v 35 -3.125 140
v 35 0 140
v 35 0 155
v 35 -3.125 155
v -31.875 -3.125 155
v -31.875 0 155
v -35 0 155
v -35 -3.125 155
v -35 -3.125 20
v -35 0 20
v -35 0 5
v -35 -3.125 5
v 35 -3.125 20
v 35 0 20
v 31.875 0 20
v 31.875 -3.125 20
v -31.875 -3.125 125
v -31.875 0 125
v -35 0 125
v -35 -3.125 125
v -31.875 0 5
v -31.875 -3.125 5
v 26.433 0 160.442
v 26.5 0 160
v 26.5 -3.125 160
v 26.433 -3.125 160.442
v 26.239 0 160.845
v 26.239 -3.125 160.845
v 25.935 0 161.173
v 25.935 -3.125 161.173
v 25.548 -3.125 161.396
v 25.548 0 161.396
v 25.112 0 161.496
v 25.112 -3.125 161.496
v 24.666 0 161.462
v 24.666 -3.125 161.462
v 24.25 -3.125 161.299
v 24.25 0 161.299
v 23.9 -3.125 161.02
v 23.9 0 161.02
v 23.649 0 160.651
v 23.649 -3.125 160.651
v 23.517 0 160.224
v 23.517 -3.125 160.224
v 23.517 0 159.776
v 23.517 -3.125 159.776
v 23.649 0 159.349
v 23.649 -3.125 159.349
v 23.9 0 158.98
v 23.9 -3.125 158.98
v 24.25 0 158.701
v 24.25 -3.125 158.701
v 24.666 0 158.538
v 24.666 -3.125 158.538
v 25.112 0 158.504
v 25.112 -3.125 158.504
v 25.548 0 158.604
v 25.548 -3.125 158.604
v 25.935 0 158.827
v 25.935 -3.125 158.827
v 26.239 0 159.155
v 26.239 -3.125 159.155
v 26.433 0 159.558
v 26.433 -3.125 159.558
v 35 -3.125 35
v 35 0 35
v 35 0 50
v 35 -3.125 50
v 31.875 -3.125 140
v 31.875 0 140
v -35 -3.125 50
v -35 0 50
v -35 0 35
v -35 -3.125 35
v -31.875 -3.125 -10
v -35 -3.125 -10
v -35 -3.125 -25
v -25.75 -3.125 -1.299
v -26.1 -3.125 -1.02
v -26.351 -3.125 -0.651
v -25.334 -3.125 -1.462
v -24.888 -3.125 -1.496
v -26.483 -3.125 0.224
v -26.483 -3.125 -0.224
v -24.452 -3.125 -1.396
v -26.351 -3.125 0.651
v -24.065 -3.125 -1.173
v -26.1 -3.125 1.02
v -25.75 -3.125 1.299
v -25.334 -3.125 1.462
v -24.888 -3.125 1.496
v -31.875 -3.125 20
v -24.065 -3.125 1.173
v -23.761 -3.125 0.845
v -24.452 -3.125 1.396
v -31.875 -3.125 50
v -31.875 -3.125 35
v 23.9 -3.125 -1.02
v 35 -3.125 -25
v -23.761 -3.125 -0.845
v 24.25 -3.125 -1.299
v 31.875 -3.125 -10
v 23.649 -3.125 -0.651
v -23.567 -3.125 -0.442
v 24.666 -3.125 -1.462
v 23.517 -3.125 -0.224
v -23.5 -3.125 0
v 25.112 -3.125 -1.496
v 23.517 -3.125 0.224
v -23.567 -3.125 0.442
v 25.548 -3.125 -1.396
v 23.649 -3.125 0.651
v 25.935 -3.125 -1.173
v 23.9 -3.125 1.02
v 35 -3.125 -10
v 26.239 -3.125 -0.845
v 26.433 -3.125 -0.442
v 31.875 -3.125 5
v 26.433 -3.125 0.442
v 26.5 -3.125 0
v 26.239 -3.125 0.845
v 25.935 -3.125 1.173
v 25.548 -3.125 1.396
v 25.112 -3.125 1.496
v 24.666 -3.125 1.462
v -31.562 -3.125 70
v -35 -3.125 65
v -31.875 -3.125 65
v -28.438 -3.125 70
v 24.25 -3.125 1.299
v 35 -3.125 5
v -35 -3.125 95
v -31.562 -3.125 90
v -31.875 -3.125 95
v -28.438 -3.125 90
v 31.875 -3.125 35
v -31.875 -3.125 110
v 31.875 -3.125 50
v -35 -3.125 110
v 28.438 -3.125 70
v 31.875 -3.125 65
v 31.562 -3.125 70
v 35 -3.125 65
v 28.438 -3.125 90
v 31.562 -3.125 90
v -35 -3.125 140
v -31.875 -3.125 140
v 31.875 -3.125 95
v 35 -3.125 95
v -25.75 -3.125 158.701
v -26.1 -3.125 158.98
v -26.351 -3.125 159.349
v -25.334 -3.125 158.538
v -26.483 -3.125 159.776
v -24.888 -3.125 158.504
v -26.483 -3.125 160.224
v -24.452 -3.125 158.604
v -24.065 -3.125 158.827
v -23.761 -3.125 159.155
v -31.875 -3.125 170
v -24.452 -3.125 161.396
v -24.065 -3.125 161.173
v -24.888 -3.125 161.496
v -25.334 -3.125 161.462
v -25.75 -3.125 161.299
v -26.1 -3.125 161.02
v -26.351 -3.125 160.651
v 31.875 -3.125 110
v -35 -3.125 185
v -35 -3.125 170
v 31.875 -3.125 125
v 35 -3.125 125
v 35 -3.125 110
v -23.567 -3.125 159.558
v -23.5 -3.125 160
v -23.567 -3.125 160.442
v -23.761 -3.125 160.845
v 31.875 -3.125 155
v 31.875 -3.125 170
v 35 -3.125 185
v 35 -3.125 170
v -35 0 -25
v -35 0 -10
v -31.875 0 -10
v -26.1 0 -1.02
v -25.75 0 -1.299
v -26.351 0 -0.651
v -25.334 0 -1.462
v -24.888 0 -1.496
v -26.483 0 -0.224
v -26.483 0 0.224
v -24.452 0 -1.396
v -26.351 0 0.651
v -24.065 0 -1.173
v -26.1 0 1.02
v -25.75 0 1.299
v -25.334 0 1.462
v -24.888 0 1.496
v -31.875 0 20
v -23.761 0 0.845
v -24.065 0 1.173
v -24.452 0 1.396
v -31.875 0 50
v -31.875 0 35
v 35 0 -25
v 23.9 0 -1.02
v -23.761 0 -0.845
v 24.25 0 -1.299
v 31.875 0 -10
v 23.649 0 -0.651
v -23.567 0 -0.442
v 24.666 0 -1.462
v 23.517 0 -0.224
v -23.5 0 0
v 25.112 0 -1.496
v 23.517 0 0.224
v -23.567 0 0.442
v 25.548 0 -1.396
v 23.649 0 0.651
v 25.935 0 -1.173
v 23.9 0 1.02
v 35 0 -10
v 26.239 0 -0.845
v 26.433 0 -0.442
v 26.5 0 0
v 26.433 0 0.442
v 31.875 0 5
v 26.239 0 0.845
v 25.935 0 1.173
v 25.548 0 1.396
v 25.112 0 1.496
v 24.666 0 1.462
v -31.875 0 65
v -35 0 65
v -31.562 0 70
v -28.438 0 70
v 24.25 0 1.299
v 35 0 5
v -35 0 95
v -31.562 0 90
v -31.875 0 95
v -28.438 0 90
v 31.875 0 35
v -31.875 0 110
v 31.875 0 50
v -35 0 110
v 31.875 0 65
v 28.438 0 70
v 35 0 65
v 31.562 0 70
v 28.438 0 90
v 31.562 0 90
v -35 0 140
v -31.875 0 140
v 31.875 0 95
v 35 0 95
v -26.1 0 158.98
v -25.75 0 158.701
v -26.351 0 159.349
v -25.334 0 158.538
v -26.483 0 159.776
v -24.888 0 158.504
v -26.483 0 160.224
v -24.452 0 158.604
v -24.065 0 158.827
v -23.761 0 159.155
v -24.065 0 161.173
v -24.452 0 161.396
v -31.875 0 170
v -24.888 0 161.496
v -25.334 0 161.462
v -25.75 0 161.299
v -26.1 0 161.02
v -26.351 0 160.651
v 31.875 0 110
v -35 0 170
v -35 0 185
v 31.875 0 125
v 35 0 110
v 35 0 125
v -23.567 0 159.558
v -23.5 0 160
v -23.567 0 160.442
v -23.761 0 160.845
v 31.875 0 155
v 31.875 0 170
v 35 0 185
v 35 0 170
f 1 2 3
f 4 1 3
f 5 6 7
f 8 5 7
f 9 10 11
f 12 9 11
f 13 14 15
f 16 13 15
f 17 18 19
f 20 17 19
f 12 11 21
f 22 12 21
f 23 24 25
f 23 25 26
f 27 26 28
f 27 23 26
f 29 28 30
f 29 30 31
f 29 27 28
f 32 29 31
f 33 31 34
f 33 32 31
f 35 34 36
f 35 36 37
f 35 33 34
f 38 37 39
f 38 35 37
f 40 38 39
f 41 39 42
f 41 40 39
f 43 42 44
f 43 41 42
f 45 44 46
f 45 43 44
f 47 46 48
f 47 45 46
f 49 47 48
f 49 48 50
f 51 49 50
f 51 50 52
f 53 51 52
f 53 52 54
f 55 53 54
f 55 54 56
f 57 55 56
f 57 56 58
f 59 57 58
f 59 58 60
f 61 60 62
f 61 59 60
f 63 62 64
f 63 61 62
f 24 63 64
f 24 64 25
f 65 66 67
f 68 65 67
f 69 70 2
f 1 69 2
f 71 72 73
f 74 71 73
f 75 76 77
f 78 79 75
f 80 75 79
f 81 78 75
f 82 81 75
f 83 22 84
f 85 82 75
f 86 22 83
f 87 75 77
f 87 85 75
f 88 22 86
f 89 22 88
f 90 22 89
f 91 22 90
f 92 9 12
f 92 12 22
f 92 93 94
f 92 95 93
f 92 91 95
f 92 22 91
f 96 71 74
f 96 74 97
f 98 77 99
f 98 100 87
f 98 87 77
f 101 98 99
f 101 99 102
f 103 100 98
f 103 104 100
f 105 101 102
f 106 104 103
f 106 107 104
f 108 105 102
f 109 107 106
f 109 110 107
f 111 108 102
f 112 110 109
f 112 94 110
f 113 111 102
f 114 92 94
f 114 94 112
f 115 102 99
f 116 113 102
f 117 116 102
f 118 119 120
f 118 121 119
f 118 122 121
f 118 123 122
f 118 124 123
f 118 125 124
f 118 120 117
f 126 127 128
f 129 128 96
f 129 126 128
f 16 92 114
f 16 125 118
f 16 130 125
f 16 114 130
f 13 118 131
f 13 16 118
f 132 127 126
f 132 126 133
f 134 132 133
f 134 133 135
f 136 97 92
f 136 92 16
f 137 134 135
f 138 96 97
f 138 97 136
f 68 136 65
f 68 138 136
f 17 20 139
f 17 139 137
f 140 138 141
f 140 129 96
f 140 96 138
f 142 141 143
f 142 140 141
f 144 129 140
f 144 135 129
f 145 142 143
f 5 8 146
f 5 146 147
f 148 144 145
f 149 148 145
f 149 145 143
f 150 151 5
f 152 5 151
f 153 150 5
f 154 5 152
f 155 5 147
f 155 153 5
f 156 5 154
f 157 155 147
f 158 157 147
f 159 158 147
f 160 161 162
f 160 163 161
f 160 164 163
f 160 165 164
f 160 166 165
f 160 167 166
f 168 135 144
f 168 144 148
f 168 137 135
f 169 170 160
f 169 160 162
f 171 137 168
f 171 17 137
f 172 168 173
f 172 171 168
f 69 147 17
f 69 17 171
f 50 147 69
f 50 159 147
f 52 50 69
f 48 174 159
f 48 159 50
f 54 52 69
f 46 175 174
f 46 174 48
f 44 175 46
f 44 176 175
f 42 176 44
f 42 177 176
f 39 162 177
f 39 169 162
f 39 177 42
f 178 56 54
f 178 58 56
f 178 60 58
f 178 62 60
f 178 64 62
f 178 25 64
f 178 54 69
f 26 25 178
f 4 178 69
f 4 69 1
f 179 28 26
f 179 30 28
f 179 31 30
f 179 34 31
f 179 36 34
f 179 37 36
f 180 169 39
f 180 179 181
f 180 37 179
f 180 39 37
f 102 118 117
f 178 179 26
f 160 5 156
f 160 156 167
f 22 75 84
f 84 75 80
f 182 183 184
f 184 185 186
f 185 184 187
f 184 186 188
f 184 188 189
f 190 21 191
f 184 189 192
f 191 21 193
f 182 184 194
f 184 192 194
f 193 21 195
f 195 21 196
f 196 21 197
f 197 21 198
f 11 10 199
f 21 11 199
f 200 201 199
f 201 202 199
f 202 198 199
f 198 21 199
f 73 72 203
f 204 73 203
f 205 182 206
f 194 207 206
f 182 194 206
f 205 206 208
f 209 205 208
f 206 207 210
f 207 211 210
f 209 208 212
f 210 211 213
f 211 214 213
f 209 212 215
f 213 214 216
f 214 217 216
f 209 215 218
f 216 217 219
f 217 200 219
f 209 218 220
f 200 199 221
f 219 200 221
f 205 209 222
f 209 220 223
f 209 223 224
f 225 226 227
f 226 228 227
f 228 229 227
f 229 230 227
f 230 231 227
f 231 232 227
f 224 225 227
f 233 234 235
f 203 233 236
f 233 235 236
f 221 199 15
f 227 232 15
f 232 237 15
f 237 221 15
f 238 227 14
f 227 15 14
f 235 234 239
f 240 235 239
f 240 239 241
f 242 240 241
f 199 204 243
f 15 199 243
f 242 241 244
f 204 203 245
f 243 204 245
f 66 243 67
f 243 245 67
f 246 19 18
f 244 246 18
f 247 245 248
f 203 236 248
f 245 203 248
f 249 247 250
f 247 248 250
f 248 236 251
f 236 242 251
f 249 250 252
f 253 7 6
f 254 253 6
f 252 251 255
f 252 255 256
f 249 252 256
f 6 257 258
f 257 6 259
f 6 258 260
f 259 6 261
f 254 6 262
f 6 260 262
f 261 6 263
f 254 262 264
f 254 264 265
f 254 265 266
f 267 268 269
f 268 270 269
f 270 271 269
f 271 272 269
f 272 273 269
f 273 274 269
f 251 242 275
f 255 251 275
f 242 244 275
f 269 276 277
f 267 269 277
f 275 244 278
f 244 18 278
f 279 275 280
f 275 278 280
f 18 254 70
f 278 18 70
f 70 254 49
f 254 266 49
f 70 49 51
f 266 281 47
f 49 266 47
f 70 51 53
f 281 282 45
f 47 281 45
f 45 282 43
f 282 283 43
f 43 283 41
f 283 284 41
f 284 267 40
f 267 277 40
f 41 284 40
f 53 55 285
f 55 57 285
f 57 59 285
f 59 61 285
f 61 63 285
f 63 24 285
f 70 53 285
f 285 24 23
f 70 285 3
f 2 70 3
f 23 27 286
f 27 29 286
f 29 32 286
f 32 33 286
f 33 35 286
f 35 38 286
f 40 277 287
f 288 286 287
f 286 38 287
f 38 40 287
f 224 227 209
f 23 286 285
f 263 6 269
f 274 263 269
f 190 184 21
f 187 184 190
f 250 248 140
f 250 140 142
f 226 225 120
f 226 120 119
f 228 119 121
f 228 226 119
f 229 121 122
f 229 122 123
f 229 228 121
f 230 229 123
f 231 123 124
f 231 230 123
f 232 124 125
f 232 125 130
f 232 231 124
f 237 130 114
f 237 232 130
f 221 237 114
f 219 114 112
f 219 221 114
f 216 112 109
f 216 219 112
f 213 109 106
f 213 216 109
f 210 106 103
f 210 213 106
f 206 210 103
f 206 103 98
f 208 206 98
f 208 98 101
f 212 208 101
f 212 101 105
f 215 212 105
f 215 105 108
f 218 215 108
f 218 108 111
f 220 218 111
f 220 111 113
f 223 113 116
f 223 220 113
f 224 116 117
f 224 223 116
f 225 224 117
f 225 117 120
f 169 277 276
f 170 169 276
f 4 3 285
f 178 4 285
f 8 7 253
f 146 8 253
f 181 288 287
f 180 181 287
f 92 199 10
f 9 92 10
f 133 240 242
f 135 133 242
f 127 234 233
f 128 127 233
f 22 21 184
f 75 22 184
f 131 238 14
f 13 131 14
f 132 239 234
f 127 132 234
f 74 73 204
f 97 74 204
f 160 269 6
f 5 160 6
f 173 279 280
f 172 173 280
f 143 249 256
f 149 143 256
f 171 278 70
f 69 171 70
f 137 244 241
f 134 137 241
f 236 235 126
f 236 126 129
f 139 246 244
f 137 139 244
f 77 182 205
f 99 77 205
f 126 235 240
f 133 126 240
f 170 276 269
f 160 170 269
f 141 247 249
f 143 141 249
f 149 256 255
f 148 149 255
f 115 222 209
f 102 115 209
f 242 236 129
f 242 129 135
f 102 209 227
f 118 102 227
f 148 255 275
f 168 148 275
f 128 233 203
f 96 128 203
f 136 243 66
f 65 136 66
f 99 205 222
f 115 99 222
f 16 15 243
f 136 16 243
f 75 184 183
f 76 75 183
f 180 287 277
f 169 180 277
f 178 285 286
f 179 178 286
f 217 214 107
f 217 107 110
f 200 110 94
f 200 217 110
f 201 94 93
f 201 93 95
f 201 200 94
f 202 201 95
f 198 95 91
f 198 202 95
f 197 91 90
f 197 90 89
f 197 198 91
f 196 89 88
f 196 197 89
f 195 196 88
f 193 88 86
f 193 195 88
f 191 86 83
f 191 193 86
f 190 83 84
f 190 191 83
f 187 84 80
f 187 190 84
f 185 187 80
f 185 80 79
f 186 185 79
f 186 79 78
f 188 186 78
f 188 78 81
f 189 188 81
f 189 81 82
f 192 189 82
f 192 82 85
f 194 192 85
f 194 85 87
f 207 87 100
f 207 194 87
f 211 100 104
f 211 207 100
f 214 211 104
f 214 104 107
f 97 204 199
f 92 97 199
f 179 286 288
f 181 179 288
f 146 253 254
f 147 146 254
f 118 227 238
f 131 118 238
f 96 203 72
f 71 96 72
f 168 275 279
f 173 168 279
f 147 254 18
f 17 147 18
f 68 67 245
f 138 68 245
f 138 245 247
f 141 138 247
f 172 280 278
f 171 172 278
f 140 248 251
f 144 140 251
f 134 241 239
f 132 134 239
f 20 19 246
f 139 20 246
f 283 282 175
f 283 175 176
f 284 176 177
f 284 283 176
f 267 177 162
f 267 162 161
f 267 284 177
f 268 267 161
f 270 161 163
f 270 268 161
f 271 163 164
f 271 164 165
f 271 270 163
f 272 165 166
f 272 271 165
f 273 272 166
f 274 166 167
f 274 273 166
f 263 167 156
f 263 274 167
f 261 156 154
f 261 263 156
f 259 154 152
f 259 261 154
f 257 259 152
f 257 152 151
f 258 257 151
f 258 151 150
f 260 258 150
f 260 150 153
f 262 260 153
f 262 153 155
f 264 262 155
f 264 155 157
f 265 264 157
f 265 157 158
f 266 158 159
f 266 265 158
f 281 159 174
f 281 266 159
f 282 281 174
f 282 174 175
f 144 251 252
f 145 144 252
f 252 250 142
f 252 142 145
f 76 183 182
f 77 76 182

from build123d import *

# Parameters (mm, degrees)
F1_R     = 1.5
F1_W     = 3.125
F1_H     = 20
F2_DEPTH = 3.125


with BuildPart() as f2:
    # F1 (on Front) → F2 (new body)
    with BuildSketch(Plane.XZ):
        Polygon((-35, -25), (0, -25), (35, -25), (35, -10), (31.875, -10), (31.875, 5), (35, 5), (35, 20), (31.875, 20), (31.875, 35), (35, 35), (35, 50), (31.875, 50), (31.875, 65), (35, 65), (35, 80), (35, 95), (31.875, 95), (31.875, 110), (35, 110), (35, 125), (31.875, 125), (31.875, 140), (35, 140), (35, 155), (31.875, 155), (31.875, 170), (35, 170), (35, 185), (0, 185), (-35, 185), (-35, 170), (-31.875, 170), (-31.875, 155), (-35, 155), (-35, 140), (-31.875, 140), (-31.875, 125), (-35, 125), (-35, 110), (-31.875, 110), (-31.875, 95), (-35, 95), (-35, 80), (-35, 65), (-31.875, 65), (-31.875, 50), (-35, 50), (-35, 35), (-31.875, 35), (-31.875, 20), (-35, 20), (-35, 5), (-31.875, 5), (-31.875, -10), (-35, -10), align=None)
        with Locations((-25, 0)):
            Circle(F1_R, mode=Mode.SUBTRACT)
        with Locations((25, 0)):
            Circle(F1_R, mode=Mode.SUBTRACT)
        with Locations((-30, 80)):
            Rectangle(F1_W, F1_H, mode=Mode.SUBTRACT)
        with Locations((-25, 160)):
            Circle(F1_R, mode=Mode.SUBTRACT)
        with Locations((30, 80)):
            Rectangle(F1_W, F1_H, mode=Mode.SUBTRACT)
        with Locations((25, 160)):
            Circle(F1_R, mode=Mode.SUBTRACT)
    extrude(amount=F2_DEPTH)


solid = f2.part
